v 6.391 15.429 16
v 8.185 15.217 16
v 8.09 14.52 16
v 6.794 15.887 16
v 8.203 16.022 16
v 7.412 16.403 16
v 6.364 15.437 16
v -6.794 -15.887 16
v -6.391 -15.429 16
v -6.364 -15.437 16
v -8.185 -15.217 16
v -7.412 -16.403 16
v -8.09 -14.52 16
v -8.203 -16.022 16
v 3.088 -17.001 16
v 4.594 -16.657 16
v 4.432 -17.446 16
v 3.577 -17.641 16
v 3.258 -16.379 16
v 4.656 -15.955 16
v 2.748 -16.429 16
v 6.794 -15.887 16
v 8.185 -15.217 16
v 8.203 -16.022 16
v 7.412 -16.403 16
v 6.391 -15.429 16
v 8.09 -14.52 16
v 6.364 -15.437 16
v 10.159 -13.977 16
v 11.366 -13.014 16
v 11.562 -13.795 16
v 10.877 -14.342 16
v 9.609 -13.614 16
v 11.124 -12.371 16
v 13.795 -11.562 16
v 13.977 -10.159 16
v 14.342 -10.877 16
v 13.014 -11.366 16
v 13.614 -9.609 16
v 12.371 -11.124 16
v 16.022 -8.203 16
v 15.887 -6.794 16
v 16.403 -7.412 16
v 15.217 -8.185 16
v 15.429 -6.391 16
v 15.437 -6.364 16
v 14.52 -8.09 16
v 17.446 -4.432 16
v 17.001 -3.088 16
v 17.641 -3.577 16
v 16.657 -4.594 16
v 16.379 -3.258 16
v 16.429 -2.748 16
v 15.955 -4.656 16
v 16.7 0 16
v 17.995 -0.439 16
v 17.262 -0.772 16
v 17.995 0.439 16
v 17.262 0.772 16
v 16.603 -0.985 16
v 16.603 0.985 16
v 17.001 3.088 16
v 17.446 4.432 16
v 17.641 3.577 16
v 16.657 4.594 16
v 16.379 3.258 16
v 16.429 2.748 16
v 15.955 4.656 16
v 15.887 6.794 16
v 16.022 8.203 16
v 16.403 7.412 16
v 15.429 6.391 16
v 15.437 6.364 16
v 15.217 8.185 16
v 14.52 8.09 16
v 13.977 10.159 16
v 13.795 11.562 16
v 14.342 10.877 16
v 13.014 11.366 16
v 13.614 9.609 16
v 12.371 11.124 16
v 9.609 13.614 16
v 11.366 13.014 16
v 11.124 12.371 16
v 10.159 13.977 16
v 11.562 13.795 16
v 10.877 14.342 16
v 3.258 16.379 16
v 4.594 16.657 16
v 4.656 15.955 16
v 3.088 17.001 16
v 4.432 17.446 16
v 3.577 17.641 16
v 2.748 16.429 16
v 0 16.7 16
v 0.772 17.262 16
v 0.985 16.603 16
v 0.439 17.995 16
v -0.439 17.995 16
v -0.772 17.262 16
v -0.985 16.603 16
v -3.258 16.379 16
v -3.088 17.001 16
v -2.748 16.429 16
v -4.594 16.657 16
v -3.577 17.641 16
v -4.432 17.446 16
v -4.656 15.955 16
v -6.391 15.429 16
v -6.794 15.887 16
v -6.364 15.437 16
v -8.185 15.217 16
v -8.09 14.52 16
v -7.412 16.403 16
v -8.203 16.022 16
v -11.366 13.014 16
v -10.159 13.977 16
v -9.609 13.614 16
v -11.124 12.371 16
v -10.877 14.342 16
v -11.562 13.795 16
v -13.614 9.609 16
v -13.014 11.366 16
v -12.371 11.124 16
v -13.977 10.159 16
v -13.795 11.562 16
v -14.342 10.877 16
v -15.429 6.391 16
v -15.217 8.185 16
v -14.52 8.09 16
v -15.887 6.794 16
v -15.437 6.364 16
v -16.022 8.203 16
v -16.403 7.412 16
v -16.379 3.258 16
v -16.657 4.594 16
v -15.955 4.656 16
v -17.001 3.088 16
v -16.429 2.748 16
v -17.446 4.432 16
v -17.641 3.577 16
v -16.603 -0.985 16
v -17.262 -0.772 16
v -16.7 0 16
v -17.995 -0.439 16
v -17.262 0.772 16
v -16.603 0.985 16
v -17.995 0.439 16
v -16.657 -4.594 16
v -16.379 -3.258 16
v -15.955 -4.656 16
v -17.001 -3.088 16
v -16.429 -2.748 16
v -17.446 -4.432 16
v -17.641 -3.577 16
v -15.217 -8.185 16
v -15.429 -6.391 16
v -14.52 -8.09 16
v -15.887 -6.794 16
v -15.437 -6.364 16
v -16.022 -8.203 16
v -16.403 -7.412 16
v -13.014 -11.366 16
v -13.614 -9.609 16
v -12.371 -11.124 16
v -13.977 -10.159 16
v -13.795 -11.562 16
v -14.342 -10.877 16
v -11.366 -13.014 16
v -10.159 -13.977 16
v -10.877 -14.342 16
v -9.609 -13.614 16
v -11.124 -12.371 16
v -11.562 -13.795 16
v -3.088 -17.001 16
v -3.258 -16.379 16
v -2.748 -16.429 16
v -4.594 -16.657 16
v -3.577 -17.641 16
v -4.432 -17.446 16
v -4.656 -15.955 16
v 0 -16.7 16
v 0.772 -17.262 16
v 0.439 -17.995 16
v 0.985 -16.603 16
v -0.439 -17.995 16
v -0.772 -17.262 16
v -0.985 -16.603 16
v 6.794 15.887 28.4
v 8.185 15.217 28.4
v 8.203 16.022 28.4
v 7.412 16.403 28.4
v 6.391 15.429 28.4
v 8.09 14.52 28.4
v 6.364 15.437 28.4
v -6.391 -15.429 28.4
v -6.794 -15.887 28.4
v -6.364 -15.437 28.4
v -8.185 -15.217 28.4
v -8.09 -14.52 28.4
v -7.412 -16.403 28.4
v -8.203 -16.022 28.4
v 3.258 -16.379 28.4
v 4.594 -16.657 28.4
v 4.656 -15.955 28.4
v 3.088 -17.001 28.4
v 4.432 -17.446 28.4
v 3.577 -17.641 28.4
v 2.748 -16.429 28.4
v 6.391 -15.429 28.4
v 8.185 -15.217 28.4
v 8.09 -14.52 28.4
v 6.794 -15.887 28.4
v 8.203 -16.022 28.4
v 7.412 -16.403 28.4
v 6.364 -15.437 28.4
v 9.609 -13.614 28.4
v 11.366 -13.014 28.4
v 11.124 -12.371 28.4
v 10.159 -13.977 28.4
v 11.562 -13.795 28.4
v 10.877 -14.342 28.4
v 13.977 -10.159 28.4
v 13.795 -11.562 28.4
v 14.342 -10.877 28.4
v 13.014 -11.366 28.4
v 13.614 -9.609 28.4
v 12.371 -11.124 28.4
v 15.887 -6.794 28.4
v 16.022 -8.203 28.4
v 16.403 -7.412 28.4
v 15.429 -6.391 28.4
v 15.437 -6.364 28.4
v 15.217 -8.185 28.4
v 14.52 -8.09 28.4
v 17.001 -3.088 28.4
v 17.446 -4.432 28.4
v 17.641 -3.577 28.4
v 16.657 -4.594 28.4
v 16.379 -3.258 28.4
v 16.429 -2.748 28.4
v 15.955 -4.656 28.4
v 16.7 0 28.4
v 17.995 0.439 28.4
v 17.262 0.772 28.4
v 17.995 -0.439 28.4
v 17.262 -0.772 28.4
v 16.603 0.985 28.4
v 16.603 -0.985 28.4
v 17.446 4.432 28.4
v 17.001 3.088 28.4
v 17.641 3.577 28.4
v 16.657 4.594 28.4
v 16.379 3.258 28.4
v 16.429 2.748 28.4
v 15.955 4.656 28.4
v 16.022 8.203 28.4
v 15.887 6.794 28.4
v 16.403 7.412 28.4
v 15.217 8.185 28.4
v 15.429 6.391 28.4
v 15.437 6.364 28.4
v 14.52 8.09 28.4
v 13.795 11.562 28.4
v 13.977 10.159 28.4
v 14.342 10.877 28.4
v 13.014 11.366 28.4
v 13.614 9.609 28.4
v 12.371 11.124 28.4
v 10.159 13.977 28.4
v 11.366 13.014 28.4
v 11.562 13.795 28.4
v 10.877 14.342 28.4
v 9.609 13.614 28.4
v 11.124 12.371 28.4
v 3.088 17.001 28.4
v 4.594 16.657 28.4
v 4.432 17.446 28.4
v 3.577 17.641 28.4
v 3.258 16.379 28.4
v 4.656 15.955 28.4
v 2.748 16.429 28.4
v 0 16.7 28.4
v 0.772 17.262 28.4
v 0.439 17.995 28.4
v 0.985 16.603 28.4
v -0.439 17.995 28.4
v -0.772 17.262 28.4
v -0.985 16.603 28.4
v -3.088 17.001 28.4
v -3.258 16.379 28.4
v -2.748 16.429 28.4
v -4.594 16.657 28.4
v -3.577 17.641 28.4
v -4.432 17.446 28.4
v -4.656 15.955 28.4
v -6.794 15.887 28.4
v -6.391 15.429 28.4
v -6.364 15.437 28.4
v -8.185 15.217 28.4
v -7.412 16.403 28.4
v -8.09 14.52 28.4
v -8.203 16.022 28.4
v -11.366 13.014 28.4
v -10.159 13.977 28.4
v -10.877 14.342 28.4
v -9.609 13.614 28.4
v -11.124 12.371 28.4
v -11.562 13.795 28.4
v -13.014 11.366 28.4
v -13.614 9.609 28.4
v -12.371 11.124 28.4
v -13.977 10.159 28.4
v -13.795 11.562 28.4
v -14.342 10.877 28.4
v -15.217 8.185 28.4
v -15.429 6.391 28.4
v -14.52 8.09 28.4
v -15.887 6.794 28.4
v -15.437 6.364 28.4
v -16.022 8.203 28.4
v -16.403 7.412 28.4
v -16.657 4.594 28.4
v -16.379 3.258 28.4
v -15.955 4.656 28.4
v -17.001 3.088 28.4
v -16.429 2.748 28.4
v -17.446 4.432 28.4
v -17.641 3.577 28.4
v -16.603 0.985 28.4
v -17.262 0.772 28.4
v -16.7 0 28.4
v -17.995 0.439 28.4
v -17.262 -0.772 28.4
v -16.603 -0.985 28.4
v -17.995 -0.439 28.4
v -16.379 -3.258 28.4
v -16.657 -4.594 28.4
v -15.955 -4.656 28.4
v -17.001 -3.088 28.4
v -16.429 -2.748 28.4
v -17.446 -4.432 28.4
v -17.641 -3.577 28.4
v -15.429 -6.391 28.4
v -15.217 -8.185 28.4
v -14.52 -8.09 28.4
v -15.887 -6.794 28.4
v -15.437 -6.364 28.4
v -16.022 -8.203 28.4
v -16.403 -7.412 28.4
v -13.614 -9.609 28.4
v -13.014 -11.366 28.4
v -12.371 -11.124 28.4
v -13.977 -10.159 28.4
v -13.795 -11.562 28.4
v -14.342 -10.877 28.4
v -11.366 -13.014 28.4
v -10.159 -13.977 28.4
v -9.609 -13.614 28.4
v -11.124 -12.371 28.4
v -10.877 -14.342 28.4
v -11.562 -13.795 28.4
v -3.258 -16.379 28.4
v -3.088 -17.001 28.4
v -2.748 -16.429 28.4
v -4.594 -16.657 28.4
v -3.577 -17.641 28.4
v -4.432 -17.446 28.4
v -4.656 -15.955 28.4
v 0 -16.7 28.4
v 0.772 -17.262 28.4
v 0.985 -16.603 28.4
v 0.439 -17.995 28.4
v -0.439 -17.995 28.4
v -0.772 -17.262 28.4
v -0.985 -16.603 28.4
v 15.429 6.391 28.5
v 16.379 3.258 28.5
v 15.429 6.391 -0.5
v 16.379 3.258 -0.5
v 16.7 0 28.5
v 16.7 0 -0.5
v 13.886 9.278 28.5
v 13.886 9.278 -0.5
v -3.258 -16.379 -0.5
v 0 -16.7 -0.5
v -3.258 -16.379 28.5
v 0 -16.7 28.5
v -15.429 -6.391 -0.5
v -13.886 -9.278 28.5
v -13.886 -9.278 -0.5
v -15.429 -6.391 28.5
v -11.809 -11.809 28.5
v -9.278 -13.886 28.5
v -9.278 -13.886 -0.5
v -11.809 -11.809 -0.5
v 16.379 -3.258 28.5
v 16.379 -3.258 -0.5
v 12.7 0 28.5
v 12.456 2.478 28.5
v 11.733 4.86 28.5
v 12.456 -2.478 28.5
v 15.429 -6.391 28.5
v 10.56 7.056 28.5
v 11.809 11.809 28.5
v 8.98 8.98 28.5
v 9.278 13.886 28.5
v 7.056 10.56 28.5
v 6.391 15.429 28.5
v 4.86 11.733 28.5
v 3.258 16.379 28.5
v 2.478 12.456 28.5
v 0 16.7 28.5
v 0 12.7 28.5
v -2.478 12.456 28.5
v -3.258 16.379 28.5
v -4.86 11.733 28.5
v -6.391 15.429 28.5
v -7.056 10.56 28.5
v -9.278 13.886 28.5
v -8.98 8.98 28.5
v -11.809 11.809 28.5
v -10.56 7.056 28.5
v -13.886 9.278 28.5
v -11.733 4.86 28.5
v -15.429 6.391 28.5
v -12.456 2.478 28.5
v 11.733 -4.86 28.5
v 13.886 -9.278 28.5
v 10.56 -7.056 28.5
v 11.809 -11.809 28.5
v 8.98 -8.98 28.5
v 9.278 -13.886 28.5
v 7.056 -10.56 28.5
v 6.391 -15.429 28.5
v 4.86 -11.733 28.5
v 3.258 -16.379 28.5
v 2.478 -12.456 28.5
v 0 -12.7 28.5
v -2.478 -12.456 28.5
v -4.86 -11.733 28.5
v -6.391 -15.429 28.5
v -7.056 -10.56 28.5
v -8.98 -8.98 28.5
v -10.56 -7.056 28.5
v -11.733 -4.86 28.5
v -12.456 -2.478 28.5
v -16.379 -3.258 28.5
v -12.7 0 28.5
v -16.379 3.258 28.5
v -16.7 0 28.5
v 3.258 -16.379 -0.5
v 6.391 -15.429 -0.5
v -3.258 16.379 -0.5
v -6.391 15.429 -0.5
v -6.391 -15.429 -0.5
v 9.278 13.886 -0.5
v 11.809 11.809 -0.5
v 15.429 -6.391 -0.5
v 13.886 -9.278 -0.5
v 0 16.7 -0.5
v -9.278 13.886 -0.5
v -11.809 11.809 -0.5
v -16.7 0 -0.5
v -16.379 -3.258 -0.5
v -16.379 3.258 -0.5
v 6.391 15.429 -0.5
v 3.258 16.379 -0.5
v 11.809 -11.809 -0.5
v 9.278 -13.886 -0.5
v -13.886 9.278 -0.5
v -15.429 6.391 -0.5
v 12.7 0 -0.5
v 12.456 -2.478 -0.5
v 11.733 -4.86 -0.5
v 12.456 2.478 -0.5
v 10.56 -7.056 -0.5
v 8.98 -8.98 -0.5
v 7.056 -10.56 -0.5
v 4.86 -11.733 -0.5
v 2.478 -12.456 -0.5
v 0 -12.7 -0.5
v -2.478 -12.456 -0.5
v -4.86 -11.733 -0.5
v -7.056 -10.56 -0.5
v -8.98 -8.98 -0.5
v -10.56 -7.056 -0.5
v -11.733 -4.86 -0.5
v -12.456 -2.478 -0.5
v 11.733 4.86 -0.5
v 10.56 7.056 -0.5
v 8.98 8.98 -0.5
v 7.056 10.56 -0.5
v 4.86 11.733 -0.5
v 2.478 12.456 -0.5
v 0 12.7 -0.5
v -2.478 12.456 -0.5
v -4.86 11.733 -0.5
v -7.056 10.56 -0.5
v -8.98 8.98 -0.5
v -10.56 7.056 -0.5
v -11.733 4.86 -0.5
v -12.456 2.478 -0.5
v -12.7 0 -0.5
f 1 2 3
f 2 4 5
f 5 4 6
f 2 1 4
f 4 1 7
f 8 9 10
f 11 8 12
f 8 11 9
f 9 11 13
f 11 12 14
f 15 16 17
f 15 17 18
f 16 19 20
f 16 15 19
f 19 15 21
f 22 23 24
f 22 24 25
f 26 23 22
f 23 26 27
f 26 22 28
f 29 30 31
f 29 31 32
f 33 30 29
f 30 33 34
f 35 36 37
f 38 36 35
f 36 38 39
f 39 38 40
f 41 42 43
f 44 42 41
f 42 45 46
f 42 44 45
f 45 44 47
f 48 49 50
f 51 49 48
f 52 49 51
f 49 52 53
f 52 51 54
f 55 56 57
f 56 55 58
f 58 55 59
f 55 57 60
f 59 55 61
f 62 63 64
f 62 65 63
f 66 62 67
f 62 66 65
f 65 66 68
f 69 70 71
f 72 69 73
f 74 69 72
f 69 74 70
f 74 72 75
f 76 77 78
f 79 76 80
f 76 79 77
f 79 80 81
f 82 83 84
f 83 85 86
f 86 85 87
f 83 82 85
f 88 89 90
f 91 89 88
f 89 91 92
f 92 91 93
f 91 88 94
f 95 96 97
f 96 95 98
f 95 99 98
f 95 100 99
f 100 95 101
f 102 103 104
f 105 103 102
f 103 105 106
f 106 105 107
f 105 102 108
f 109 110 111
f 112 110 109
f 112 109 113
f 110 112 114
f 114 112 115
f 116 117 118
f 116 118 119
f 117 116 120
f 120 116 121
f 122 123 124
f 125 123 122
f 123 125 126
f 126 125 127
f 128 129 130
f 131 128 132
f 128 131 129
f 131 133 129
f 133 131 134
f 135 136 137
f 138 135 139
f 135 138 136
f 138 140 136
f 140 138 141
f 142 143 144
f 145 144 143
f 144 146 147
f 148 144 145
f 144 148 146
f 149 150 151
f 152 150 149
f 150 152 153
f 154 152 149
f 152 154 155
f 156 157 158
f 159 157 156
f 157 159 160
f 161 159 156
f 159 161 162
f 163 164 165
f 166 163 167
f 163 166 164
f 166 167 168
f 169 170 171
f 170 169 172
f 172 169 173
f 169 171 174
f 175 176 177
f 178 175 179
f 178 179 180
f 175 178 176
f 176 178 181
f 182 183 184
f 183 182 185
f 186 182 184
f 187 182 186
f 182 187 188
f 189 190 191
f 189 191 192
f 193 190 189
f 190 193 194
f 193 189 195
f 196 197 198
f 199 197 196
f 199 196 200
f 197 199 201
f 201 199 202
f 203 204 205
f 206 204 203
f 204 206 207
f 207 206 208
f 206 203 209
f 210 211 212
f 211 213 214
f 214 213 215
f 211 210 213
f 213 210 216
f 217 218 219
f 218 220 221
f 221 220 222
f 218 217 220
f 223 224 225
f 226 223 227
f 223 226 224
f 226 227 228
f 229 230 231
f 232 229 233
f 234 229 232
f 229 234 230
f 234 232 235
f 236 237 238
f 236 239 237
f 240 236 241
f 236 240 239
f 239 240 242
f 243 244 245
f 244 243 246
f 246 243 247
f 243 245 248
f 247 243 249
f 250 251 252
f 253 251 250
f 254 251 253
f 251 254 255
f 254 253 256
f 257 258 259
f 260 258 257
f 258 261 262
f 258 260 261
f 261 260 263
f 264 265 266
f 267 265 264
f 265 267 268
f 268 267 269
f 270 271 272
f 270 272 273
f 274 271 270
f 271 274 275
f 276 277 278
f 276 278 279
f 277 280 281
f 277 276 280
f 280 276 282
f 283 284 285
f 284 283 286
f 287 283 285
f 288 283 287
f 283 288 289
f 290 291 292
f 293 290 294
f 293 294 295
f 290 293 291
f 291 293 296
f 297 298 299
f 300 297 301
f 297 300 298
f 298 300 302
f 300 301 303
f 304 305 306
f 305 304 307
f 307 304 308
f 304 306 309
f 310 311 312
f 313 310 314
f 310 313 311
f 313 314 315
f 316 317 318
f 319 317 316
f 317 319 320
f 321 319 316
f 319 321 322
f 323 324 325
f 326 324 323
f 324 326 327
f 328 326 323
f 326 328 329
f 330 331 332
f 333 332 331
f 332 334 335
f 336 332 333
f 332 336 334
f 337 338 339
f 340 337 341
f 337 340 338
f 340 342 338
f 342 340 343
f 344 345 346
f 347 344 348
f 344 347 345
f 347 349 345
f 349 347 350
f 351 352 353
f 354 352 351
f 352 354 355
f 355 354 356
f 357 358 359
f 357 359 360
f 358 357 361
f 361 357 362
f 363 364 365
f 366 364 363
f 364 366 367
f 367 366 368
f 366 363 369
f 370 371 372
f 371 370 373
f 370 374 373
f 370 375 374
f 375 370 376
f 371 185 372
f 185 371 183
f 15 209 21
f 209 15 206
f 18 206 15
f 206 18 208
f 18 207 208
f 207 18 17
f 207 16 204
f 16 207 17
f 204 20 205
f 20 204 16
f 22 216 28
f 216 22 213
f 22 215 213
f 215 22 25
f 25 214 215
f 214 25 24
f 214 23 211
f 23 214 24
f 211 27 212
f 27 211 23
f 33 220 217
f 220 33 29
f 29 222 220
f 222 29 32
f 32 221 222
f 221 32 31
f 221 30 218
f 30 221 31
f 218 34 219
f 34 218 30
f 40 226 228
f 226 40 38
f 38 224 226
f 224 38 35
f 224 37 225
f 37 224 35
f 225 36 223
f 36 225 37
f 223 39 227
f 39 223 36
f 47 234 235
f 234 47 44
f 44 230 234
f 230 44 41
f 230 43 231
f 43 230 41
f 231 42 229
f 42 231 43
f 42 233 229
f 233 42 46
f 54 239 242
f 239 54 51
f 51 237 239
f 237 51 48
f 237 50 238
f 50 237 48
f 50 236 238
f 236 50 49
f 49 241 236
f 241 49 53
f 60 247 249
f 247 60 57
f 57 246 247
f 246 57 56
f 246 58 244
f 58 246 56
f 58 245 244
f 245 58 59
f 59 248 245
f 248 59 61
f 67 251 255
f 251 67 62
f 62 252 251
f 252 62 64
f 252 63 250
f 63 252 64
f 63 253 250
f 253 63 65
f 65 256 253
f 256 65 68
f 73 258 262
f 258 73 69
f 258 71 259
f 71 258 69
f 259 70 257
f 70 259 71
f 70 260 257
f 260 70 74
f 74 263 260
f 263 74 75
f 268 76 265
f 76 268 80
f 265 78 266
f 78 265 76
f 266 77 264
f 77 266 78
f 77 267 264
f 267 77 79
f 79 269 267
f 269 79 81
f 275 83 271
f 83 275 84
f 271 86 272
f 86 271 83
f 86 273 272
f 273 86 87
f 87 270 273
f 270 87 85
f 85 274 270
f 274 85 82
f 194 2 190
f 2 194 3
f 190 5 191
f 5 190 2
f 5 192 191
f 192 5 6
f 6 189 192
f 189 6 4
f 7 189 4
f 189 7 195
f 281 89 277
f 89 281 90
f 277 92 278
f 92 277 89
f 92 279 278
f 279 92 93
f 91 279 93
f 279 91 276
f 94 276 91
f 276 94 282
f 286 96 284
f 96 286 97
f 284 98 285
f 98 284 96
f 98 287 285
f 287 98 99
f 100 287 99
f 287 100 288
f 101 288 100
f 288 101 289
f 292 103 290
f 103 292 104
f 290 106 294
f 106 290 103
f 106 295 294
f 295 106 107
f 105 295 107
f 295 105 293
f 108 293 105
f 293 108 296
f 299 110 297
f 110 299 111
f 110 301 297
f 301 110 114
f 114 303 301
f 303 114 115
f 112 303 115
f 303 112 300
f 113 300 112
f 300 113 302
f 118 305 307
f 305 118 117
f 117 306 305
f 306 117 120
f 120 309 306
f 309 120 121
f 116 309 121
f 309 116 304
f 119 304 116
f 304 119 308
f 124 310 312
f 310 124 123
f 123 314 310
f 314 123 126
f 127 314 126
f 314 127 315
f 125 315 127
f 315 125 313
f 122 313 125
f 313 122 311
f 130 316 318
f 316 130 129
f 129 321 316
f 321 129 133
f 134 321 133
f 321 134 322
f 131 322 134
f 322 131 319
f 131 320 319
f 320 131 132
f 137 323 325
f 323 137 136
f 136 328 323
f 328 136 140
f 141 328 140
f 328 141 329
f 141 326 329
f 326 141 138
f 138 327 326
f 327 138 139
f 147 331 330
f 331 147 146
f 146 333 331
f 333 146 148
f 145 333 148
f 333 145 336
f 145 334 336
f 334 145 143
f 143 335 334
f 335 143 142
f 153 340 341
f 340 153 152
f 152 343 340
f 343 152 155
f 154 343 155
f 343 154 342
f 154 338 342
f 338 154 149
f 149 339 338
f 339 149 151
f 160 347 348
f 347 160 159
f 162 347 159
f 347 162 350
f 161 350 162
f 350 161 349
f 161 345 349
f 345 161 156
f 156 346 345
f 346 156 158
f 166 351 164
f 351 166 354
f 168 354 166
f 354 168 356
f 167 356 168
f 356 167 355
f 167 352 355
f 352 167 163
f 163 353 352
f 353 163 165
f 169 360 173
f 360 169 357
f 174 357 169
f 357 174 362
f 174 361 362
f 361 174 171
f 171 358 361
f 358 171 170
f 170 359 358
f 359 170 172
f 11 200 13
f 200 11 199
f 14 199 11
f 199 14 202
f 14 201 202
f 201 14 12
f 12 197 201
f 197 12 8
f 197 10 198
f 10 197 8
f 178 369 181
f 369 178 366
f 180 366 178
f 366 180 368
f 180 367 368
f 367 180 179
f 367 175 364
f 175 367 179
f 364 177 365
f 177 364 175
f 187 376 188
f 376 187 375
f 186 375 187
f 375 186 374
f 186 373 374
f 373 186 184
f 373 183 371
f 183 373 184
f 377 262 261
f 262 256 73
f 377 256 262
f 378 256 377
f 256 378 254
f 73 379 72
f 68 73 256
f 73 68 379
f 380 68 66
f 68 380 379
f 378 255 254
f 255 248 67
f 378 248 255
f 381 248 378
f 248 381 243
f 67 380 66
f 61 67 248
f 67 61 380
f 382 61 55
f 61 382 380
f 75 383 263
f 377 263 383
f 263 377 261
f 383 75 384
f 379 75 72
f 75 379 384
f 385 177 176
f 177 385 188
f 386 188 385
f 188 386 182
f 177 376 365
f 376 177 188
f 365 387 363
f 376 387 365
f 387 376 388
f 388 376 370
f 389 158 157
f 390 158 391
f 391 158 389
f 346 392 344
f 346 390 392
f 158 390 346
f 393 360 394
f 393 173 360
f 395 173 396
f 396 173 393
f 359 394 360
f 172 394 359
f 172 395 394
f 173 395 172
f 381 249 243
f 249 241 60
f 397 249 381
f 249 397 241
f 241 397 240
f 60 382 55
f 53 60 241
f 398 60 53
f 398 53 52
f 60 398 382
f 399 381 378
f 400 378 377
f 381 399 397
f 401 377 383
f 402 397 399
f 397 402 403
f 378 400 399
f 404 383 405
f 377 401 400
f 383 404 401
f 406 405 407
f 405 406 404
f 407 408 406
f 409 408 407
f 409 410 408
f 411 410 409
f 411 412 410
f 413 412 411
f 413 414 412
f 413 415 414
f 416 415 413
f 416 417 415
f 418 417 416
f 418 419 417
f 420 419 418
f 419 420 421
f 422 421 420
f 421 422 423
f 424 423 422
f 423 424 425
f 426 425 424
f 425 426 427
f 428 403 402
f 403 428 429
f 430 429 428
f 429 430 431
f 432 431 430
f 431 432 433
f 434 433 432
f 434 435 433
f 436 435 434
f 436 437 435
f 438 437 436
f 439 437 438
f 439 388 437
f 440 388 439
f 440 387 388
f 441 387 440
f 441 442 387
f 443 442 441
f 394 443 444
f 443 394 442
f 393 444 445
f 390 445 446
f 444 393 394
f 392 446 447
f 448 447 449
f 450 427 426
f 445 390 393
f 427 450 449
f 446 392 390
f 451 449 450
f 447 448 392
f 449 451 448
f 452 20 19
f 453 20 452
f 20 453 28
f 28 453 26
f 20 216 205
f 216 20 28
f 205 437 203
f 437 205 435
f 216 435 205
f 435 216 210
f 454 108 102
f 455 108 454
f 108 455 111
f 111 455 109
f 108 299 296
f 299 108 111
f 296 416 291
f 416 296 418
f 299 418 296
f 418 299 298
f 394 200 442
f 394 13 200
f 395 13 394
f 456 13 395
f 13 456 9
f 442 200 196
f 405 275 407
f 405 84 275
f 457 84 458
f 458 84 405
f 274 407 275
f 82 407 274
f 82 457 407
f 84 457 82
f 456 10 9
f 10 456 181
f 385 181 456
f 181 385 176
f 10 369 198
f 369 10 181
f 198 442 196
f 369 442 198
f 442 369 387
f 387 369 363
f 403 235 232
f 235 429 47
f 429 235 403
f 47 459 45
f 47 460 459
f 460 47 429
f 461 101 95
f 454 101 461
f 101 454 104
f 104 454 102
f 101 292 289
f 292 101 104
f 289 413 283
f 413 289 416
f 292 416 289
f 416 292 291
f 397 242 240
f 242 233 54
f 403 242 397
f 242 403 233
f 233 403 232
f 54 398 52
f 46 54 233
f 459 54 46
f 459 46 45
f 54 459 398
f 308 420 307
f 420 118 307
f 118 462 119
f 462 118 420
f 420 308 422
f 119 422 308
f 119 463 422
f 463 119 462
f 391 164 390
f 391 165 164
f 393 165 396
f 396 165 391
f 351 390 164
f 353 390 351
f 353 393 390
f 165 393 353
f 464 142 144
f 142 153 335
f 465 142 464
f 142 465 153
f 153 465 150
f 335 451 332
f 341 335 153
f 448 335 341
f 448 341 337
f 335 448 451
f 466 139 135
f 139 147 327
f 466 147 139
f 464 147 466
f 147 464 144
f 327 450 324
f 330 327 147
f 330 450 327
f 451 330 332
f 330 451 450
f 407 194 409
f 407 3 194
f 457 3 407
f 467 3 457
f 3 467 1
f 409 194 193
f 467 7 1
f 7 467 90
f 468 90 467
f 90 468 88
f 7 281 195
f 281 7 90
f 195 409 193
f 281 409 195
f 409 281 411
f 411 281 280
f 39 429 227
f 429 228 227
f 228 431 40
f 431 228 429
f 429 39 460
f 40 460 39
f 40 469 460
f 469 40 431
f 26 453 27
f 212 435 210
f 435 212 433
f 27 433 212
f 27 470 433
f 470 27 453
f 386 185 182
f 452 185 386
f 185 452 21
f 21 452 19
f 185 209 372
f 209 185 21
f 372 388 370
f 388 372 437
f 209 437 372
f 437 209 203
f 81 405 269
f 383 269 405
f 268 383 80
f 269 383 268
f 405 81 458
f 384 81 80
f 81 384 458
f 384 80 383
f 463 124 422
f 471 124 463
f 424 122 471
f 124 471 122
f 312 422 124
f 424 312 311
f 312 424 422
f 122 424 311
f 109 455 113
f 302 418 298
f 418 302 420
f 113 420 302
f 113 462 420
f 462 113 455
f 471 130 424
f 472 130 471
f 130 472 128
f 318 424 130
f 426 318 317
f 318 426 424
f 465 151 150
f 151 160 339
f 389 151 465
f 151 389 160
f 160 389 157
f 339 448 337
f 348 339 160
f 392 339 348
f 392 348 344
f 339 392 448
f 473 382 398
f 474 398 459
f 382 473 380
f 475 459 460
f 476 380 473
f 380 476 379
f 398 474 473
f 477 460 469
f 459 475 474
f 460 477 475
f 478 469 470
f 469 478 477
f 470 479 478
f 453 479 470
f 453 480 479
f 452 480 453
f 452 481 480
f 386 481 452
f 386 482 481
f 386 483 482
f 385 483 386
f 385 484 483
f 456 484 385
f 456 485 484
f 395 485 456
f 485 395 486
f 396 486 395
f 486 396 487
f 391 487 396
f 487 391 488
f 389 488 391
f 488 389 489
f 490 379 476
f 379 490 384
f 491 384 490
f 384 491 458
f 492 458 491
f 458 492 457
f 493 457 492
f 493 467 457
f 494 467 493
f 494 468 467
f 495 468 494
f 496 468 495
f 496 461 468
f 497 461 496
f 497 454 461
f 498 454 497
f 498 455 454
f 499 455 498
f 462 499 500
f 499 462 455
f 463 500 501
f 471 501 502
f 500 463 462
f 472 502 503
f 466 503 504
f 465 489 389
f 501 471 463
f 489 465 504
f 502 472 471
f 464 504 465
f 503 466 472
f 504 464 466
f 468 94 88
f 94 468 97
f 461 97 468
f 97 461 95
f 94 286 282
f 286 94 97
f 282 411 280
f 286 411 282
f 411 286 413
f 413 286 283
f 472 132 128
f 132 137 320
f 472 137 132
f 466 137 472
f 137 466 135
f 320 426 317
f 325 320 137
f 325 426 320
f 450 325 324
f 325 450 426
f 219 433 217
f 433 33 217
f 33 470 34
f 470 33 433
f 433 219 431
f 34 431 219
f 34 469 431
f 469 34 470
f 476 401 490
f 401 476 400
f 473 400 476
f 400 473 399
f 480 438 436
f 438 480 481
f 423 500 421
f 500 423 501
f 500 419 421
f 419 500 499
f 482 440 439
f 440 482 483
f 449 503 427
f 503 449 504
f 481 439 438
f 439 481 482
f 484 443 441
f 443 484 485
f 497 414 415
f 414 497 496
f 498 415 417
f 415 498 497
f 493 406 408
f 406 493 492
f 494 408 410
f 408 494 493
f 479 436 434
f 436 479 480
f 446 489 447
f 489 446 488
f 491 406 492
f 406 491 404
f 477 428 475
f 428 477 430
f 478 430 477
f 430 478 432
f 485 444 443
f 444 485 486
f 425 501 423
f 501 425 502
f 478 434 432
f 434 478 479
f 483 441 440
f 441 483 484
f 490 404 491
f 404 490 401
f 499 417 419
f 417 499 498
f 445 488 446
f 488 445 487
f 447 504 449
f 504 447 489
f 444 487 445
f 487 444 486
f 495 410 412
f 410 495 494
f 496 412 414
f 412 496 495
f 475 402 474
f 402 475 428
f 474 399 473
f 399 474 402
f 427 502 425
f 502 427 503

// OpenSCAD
$fn = 32;

// ----------------------------------------------------------------------
// Two-module gear rim: z12 m2 and z28 m1.2, 28 mm wide
// ----------------------------------------------------------------------

// --- parameters (mm) ---
module_a = 2;             // first tooth module
teeth_a = 12;             // first band tooth count
module_b = 1.2;           // second tooth module
teeth_b = 28;             // second band tooth count
band_h = 12;              // height of one tooth band
web_t = 4;                // web thickness between the bands
total = 28;               // overall width over both bands
root_r = 9.5;             // root radius of the coarse band
hub_r = 16.7;             // hub radius
bore_d = 25.4;            // hub bore
hole_count = 6;           // lightening holes
hole_r = 7.75;            // lightening hole circle radius
hole_d = 4;               // lightening hole diameter

band_a = [[9.4, -1.378], [12.124, -1.51], [13.058, -1.154], [13.986, -0.621], [13.986, 0.621], [13.058, 1.154], [12.124, 1.51], [9.4, 1.378], [8.829, 3.507], [11.254, 4.755], [11.885, 5.53], [12.423, 6.456], [11.802, 7.531], [10.732, 7.528], [9.745, 7.369], [7.451, 5.893], [5.893, 7.451], [7.369, 9.745], [7.528, 10.732], [7.531, 11.802], [6.456, 12.423], [5.53, 11.885], [4.755, 11.254], [3.507, 8.829], [1.378, 9.4], [1.51, 12.124], [1.154, 13.058], [0.621, 13.986], [-0.621, 13.986], [-1.154, 13.058], [-1.51, 12.124], [-1.378, 9.4], [-3.507, 8.829], [-4.755, 11.254], [-5.53, 11.885], [-6.456, 12.423], [-7.531, 11.802], [-7.528, 10.732], [-7.369, 9.745], [-5.893, 7.451], [-7.451, 5.893], [-9.745, 7.369], [-10.732, 7.528], [-11.802, 7.531], [-12.423, 6.456], [-11.885, 5.53], [-11.254, 4.755], [-8.829, 3.507], [-9.4, 1.378], [-12.124, 1.51], [-13.058, 1.154], [-13.986, 0.621], [-13.986, -0.621], [-13.058, -1.154], [-12.124, -1.51], [-9.4, -1.378], [-8.829, -3.507], [-11.254, -4.755], [-11.885, -5.53], [-12.423, -6.456], [-11.802, -7.531], [-10.732, -7.528], [-9.745, -7.369], [-7.451, -5.893], [-5.893, -7.451], [-7.369, -9.745], [-7.528, -10.732], [-7.531, -11.802], [-6.456, -12.423], [-5.53, -11.885], [-4.755, -11.254], [-3.507, -8.829], [-1.378, -9.4], [-1.51, -12.124], [-1.154, -13.058], [-0.621, -13.986], [0.621, -13.986], [1.154, -13.058], [1.51, -12.124], [1.378, -9.4], [3.507, -8.829], [4.755, -11.254], [5.53, -11.885], [6.456, -12.423], [7.531, -11.802], [7.528, -10.732], [7.369, -9.745], [5.893, -7.451], [7.451, -5.893], [9.745, -7.369], [10.732, -7.528], [11.802, -7.531], [12.423, -6.456], [11.885, -5.53], [11.254, -4.755], [8.829, -3.507]];
band_b = [[15.262, -1.083], [16.527, -1.01], [17.262, -0.772], [17.995, -0.439], [17.995, 0.439], [17.262, 0.772], [16.527, 1.01], [15.262, 1.083], [15.12, 2.34], [16.337, 2.693], [17.001, 3.088], [17.641, 3.577], [17.446, 4.432], [16.657, 4.594], [15.888, 4.662], [14.638, 4.452], [14.22, 5.646], [15.329, 6.261], [15.887, 6.794], [16.403, 7.412], [16.022, 8.203], [15.217, 8.185], [14.452, 8.081], [13.28, 7.597], [12.607, 8.669], [13.551, 9.515], [13.977, 10.159], [14.342, 10.877], [13.795, 11.562], [13.014, 11.366], [12.292, 11.094], [11.257, 10.362], [10.362, 11.257], [11.094, 12.292], [11.366, 13.014], [11.562, 13.795], [10.877, 14.342], [10.159, 13.977], [9.515, 13.551], [8.669, 12.607], [7.597, 13.28], [8.081, 14.452], [8.185, 15.217], [8.203, 16.022], [7.412, 16.403], [6.794, 15.887], [6.261, 15.329], [5.646, 14.22], [4.452, 14.638], [4.662, 15.888], [4.594, 16.657], [4.432, 17.446], [3.577, 17.641], [3.088, 17.001], [2.693, 16.337], [2.34, 15.12], [1.083, 15.262], [1.01, 16.527], [0.772, 17.262], [0.439, 17.995], [-0.439, 17.995], [-0.772, 17.262], [-1.01, 16.527], [-1.083, 15.262], [-2.34, 15.12], [-2.693, 16.337], [-3.088, 17.001], [-3.577, 17.641], [-4.432, 17.446], [-4.594, 16.657], [-4.662, 15.888], [-4.452, 14.638], [-5.646, 14.22], [-6.261, 15.329], [-6.794, 15.887], [-7.412, 16.403], [-8.203, 16.022], [-8.185, 15.217], [-8.081, 14.452], [-7.597, 13.28], [-8.669, 12.607], [-9.515, 13.551], [-10.159, 13.977], [-10.877, 14.342], [-11.562, 13.795], [-11.366, 13.014], [-11.094, 12.292], [-10.362, 11.257], [-11.257, 10.362], [-12.292, 11.094], [-13.014, 11.366], [-13.795, 11.562], [-14.342, 10.877], [-13.977, 10.159], [-13.551, 9.515], [-12.607, 8.669], [-13.28, 7.597], [-14.452, 8.081], [-15.217, 8.185], [-16.022, 8.203], [-16.403, 7.412], [-15.887, 6.794], [-15.329, 6.261], [-14.22, 5.646], [-14.638, 4.452], [-15.888, 4.662], [-16.657, 4.594], [-17.446, 4.432], [-17.641, 3.577], [-17.001, 3.088], [-16.337, 2.693], [-15.12, 2.34], [-15.262, 1.083], [-16.527, 1.01], [-17.262, 0.772], [-17.995, 0.439], [-17.995, -0.439], [-17.262, -0.772], [-16.527, -1.01], [-15.262, -1.083], [-15.12, -2.34], [-16.337, -2.693], [-17.001, -3.088], [-17.641, -3.577], [-17.446, -4.432], [-16.657, -4.594], [-15.888, -4.662], [-14.638, -4.452], [-14.22, -5.646], [-15.329, -6.261], [-15.887, -6.794], [-16.403, -7.412], [-16.022, -8.203], [-15.217, -8.185], [-14.452, -8.081], [-13.28, -7.597], [-12.607, -8.669], [-13.551, -9.515], [-13.977, -10.159], [-14.342, -10.877], [-13.795, -11.562], [-13.014, -11.366], [-12.292, -11.094], [-11.257, -10.362], [-10.362, -11.257], [-11.094, -12.292], [-11.366, -13.014], [-11.562, -13.795], [-10.877, -14.342], [-10.159, -13.977], [-9.515, -13.551], [-8.669, -12.607], [-7.597, -13.28], [-8.081, -14.452], [-8.185, -15.217], [-8.203, -16.022], [-7.412, -16.403], [-6.794, -15.887], [-6.261, -15.329], [-5.646, -14.22], [-4.452, -14.638], [-4.662, -15.888], [-4.594, -16.657], [-4.432, -17.446], [-3.577, -17.641], [-3.088, -17.001], [-2.693, -16.337], [-2.34, -15.12], [-1.083, -15.262], [-1.01, -16.527], [-0.772, -17.262], [-0.439, -17.995], [0.439, -17.995], [0.772, -17.262], [1.01, -16.527], [1.083, -15.262], [2.34, -15.12], [2.693, -16.337], [3.088, -17.001], [3.577, -17.641], [4.432, -17.446], [4.594, -16.657], [4.662, -15.888], [4.452, -14.638], [5.646, -14.22], [6.261, -15.329], [6.794, -15.887], [7.412, -16.403], [8.203, -16.022], [8.185, -15.217], [8.081, -14.452], [7.597, -13.28], [8.669, -12.607], [9.515, -13.551], [10.159, -13.977], [10.877, -14.342], [11.562, -13.795], [11.366, -13.014], [11.094, -12.292], [10.362, -11.257], [11.257, -10.362], [12.292, -11.094], [13.014, -11.366], [13.795, -11.562], [14.342, -10.877], [13.977, -10.159], [13.551, -9.515], [12.607, -8.669], [13.28, -7.597], [14.452, -8.081], [15.217, -8.185], [16.022, -8.203], [16.403, -7.412], [15.887, -6.794], [15.329, -6.261], [14.22, -5.646], [14.638, -4.452], [15.888, -4.662], [16.657, -4.594], [17.446, -4.432], [17.641, -3.577], [17.001, -3.088], [16.337, -2.693], [15.12, -2.34]];

difference() {
  union() {
    /* tooth band A, overlapping the web by 0.4 mm */
    linear_extrude(height = band_h + 0.4) polygon(band_a);
    /* web */
    translate([0, 0, band_h - 0.4]) cylinder(h = web_t + 0.8, d = 2 * root_r);
    /* tooth band B */
    translate([0, 0, band_h + web_t]) linear_extrude(height = band_h + 0.4) polygon(band_b);
    /* hub */
    translate([0, 0, -0.5]) cylinder(h = total + 1.0, d = 2 * hub_r);
  }
  /* bore */
  translate([0, 0, -2.5]) cylinder(h = total + 5, d = bore_d);
  /* lightening holes through the web */
  for (i = [0 : hole_count - 1]) {
    a = i * 360 / hole_count;
    translate([hole_r * cos(a), hole_r * sin(a), -2.5]) cylinder(h = total + 5, d = hole_d);
  }
}
